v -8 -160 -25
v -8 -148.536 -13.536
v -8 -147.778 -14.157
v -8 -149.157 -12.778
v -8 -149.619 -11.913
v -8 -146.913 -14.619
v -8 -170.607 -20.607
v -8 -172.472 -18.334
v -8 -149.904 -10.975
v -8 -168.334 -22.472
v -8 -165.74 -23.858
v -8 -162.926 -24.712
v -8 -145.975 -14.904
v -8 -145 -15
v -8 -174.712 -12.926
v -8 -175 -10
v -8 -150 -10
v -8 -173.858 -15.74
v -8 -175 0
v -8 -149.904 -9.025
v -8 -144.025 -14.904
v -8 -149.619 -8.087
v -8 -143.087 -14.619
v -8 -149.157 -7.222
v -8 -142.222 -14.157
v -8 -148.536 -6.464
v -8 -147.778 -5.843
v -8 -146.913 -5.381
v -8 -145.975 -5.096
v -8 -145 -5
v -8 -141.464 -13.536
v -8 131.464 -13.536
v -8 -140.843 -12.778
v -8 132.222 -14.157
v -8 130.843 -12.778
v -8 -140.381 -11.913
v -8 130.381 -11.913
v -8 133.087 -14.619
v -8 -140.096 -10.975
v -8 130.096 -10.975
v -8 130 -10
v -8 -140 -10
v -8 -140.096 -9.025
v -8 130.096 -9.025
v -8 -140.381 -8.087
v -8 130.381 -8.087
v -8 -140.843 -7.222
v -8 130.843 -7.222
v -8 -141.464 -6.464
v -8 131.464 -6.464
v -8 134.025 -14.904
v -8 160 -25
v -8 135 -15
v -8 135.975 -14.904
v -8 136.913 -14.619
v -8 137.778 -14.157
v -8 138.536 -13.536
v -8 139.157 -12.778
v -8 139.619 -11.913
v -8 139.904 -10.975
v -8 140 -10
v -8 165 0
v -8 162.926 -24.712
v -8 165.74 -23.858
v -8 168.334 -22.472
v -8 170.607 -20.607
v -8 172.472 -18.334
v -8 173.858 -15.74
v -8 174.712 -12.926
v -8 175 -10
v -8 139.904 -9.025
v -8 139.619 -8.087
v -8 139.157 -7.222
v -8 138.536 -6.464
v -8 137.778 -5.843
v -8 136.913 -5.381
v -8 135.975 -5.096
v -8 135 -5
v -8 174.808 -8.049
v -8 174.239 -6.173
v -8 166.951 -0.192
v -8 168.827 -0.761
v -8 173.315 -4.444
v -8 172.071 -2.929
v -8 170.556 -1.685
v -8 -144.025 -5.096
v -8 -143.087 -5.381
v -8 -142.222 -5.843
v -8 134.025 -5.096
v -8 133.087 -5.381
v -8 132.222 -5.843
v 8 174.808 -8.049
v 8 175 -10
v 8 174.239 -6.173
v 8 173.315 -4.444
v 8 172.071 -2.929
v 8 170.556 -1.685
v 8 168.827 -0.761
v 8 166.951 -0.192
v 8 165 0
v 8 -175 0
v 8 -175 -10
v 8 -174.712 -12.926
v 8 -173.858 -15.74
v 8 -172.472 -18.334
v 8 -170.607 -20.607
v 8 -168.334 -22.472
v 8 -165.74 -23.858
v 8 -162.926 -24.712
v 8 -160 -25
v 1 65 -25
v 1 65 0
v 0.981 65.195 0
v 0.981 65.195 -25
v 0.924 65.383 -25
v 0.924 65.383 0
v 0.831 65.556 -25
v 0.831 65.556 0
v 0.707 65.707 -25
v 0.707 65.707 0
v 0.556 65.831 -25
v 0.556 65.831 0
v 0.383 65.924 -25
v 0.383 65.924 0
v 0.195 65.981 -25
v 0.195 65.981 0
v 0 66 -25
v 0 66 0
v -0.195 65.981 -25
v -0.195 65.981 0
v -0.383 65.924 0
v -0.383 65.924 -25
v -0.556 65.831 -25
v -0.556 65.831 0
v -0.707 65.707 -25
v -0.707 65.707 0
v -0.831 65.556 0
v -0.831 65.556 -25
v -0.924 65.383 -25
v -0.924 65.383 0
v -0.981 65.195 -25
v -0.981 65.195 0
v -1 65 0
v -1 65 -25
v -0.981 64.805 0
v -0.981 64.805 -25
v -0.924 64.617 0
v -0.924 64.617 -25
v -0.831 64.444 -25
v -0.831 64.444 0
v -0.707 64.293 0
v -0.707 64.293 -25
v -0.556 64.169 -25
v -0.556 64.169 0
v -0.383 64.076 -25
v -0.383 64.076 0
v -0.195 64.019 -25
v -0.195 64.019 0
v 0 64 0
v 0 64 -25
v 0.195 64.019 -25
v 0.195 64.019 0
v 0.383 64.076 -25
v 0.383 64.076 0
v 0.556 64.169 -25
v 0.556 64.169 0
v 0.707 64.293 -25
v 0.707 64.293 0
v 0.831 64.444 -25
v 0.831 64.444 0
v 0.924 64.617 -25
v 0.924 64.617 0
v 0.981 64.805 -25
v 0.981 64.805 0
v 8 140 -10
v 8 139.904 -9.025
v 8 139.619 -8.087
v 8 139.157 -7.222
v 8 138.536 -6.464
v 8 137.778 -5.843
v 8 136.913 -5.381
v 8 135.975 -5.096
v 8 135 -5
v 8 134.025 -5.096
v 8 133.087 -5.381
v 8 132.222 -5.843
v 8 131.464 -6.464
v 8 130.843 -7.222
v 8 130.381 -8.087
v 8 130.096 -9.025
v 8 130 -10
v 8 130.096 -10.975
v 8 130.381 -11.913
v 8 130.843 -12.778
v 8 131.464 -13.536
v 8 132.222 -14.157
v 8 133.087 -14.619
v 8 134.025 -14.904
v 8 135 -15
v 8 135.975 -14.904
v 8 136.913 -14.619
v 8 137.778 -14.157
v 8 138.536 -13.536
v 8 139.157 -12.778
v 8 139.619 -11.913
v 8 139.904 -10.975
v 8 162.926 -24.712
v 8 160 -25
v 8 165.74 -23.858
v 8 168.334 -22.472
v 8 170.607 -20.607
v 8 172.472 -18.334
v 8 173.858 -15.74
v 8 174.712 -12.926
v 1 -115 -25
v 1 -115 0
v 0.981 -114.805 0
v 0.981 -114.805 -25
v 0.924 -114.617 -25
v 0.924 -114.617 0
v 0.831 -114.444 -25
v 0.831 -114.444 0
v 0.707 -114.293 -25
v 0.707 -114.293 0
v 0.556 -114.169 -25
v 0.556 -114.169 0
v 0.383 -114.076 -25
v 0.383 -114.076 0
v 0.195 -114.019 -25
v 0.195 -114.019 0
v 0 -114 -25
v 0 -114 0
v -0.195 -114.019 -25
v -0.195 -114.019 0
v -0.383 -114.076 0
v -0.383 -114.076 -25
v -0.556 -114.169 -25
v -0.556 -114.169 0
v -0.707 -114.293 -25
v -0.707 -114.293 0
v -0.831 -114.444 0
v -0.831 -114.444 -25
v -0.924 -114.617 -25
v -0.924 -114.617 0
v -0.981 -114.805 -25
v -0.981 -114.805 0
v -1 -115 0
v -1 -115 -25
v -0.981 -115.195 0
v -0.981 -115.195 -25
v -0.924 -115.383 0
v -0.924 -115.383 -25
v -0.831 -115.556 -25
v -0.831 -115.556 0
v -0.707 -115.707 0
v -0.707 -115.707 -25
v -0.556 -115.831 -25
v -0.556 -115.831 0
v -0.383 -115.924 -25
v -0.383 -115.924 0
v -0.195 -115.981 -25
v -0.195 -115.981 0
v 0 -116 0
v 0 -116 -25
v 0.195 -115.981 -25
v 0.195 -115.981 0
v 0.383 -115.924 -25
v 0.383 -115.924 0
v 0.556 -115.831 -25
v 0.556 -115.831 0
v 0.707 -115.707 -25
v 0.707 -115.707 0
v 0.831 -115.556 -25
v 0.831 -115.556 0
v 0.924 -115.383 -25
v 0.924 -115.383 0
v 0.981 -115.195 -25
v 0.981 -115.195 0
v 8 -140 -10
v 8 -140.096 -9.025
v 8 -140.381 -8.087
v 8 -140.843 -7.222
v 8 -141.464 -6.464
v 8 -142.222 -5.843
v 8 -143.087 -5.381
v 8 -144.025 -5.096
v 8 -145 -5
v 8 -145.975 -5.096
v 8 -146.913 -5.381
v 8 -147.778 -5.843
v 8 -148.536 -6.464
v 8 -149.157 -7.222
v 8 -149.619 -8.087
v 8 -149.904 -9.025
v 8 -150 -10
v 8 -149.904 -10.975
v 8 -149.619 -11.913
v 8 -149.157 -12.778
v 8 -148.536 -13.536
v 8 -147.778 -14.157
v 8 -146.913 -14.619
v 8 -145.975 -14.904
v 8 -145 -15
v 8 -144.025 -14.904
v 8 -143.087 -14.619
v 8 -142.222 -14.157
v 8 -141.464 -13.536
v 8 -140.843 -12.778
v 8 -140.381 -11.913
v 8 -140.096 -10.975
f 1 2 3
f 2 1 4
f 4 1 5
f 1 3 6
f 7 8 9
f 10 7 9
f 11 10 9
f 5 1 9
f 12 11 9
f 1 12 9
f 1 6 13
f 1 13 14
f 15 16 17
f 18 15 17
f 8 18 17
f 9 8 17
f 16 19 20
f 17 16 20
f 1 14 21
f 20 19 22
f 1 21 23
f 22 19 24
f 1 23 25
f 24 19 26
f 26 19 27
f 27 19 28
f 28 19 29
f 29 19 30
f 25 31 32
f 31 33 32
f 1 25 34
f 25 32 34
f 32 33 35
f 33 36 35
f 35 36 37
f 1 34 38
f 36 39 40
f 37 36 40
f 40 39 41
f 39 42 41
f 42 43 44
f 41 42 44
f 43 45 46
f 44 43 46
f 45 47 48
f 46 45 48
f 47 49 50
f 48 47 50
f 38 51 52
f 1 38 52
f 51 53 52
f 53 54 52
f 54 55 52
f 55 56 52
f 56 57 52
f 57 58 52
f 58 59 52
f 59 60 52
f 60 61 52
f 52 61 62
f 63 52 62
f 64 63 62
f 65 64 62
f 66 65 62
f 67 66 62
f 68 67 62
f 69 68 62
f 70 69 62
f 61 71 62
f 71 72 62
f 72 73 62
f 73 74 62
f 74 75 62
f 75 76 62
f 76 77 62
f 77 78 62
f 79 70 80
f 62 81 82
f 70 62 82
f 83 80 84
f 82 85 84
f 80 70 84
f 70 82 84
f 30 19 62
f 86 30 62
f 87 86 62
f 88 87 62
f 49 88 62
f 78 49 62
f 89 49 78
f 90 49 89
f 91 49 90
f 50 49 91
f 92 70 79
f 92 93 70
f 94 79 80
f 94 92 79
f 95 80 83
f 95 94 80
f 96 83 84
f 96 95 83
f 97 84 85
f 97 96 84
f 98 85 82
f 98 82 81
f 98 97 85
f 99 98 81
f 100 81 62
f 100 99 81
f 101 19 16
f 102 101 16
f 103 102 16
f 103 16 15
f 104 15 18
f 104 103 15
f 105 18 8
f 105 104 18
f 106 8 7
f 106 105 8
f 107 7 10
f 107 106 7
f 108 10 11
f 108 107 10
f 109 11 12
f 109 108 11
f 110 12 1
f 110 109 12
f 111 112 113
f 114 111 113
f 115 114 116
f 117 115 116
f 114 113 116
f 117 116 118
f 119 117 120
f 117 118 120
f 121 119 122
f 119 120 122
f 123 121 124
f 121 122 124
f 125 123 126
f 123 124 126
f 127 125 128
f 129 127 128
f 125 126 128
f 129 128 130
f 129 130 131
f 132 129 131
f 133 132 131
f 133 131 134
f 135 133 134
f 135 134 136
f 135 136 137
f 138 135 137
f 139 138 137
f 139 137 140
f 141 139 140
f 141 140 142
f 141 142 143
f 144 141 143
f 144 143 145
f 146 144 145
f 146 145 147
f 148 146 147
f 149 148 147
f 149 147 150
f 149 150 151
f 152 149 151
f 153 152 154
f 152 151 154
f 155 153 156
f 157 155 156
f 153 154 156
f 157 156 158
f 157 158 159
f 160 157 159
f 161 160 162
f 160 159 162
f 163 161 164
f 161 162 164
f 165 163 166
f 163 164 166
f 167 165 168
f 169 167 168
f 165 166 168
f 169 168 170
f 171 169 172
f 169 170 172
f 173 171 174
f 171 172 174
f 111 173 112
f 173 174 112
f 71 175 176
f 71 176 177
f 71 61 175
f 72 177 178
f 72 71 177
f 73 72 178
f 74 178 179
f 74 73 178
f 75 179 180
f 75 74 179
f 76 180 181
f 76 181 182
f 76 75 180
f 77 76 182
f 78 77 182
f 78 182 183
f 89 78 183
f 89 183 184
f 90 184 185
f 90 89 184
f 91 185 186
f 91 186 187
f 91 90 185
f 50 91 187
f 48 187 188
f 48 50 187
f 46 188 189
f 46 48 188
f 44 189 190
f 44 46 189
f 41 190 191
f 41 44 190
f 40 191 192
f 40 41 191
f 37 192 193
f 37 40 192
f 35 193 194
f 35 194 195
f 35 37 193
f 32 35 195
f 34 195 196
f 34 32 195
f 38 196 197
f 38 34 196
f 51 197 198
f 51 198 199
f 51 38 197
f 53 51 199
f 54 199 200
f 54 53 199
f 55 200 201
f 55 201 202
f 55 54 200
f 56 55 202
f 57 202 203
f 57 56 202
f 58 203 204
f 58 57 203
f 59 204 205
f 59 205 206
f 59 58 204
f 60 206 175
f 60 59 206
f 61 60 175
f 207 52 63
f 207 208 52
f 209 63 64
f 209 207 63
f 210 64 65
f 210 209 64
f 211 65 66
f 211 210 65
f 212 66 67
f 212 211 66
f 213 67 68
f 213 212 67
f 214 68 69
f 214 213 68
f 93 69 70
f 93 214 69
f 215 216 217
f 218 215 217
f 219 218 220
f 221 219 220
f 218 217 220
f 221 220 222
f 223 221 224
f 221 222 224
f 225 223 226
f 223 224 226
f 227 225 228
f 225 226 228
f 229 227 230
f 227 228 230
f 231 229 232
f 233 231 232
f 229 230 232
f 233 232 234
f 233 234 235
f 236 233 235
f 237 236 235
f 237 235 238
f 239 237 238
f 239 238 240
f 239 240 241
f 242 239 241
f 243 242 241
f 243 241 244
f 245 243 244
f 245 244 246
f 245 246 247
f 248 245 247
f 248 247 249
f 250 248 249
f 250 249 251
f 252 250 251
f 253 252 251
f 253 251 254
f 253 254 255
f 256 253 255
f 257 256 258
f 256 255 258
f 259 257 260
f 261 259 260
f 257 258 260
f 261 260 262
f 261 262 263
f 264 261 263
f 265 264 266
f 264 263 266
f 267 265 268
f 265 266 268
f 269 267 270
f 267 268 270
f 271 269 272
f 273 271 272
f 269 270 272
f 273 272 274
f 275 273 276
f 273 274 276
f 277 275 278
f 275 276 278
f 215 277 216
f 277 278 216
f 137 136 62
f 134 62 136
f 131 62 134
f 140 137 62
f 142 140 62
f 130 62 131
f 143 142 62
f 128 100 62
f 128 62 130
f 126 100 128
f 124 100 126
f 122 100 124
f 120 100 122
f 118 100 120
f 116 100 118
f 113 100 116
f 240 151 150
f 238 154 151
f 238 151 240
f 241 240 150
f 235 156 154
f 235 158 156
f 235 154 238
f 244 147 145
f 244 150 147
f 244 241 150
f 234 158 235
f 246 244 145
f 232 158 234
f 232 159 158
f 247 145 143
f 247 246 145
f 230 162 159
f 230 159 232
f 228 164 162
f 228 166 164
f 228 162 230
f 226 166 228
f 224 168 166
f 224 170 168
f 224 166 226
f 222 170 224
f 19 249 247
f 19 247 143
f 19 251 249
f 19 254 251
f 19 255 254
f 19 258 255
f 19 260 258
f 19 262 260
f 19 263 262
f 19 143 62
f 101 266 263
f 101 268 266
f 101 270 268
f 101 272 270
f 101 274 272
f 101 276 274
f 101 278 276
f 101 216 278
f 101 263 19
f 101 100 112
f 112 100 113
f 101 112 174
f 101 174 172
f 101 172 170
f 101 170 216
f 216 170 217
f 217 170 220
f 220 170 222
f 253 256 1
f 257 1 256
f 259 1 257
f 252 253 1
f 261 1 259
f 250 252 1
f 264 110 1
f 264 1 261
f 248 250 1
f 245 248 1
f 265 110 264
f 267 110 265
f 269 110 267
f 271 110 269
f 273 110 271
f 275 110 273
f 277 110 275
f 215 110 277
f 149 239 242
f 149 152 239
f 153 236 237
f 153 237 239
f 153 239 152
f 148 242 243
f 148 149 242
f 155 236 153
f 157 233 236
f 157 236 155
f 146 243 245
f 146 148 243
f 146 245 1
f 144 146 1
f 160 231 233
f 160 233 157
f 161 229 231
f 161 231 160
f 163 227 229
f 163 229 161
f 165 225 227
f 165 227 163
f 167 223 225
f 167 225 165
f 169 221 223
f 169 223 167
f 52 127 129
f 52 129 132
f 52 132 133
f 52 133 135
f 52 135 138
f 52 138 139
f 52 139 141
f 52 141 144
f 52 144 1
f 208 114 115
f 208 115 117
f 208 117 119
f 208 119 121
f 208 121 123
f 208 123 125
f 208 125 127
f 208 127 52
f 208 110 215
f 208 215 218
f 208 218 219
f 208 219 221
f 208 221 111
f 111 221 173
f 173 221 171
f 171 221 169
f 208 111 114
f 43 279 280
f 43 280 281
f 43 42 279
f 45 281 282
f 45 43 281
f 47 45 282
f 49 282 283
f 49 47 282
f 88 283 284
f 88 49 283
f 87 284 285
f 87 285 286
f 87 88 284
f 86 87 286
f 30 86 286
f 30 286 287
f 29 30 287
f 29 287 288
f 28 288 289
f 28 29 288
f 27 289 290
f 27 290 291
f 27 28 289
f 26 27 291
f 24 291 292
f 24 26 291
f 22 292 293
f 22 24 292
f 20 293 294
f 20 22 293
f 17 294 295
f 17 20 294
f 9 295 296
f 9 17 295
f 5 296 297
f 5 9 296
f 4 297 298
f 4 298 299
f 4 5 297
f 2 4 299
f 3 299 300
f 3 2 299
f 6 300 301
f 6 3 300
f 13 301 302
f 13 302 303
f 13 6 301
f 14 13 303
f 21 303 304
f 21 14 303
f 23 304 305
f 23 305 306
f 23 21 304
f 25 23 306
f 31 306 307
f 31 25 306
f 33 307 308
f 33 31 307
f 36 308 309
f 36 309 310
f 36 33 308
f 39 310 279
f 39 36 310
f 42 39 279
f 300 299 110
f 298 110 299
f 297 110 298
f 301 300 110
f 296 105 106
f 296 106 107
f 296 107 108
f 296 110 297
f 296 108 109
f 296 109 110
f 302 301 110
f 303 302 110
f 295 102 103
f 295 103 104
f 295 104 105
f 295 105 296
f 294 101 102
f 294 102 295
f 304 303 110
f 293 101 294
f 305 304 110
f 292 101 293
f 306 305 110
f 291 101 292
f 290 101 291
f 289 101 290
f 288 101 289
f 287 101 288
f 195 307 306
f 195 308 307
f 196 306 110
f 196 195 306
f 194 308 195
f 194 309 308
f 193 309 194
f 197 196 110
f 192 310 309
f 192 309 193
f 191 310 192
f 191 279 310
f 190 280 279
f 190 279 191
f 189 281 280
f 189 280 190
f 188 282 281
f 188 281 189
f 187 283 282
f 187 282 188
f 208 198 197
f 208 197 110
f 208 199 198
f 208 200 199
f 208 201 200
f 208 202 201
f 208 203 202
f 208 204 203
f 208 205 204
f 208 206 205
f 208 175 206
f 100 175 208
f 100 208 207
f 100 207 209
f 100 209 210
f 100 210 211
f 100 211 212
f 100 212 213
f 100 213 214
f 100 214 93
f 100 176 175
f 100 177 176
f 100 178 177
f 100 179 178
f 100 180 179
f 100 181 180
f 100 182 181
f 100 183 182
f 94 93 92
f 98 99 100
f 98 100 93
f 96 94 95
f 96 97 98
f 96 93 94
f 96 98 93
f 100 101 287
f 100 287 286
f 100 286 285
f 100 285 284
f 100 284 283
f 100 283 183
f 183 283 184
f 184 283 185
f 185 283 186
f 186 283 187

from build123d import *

# Parameters (mm, degrees)
F0_R     = 5
F1_DEPTH = 8
F2_R     = 1
F3_DEPTH = 25.001


with BuildPart() as f1:
    # F0 (on Right) → F1 (new body, symmetric)
    with BuildSketch(Plane.YZ):
        with BuildLine():
            ThreePointArc((175, -10), (172.071068, -2.928932), (165, 0))
            Line((165, 0), (-175, 0))
            Line((-175, 0), (-175, -10))
            ThreePointArc((-175, -10), (-170.606602, -20.606602), (-160, -25))
            Line((-160, -25), (160, -25))
            ThreePointArc((160, -25), (170.606602, -20.606602), (175, -10))
        make_face()
        with Locations((-145, -10)):
            Circle(F0_R, mode=Mode.SUBTRACT)
        with Locations((135, -10)):
            Circle(F0_R, mode=Mode.SUBTRACT)
    extrude(amount=F1_DEPTH, both=True)

    # F2 (on Top) → F3 (cut, through all)
    with BuildSketch(Plane.XY):
        with Locations((0, 65)):
            Circle(F2_R)
        with Locations((0, -115)):
            Circle(F2_R)
    extrude(amount=-F3_DEPTH, mode=Mode.SUBTRACT)


solid = f1.part
